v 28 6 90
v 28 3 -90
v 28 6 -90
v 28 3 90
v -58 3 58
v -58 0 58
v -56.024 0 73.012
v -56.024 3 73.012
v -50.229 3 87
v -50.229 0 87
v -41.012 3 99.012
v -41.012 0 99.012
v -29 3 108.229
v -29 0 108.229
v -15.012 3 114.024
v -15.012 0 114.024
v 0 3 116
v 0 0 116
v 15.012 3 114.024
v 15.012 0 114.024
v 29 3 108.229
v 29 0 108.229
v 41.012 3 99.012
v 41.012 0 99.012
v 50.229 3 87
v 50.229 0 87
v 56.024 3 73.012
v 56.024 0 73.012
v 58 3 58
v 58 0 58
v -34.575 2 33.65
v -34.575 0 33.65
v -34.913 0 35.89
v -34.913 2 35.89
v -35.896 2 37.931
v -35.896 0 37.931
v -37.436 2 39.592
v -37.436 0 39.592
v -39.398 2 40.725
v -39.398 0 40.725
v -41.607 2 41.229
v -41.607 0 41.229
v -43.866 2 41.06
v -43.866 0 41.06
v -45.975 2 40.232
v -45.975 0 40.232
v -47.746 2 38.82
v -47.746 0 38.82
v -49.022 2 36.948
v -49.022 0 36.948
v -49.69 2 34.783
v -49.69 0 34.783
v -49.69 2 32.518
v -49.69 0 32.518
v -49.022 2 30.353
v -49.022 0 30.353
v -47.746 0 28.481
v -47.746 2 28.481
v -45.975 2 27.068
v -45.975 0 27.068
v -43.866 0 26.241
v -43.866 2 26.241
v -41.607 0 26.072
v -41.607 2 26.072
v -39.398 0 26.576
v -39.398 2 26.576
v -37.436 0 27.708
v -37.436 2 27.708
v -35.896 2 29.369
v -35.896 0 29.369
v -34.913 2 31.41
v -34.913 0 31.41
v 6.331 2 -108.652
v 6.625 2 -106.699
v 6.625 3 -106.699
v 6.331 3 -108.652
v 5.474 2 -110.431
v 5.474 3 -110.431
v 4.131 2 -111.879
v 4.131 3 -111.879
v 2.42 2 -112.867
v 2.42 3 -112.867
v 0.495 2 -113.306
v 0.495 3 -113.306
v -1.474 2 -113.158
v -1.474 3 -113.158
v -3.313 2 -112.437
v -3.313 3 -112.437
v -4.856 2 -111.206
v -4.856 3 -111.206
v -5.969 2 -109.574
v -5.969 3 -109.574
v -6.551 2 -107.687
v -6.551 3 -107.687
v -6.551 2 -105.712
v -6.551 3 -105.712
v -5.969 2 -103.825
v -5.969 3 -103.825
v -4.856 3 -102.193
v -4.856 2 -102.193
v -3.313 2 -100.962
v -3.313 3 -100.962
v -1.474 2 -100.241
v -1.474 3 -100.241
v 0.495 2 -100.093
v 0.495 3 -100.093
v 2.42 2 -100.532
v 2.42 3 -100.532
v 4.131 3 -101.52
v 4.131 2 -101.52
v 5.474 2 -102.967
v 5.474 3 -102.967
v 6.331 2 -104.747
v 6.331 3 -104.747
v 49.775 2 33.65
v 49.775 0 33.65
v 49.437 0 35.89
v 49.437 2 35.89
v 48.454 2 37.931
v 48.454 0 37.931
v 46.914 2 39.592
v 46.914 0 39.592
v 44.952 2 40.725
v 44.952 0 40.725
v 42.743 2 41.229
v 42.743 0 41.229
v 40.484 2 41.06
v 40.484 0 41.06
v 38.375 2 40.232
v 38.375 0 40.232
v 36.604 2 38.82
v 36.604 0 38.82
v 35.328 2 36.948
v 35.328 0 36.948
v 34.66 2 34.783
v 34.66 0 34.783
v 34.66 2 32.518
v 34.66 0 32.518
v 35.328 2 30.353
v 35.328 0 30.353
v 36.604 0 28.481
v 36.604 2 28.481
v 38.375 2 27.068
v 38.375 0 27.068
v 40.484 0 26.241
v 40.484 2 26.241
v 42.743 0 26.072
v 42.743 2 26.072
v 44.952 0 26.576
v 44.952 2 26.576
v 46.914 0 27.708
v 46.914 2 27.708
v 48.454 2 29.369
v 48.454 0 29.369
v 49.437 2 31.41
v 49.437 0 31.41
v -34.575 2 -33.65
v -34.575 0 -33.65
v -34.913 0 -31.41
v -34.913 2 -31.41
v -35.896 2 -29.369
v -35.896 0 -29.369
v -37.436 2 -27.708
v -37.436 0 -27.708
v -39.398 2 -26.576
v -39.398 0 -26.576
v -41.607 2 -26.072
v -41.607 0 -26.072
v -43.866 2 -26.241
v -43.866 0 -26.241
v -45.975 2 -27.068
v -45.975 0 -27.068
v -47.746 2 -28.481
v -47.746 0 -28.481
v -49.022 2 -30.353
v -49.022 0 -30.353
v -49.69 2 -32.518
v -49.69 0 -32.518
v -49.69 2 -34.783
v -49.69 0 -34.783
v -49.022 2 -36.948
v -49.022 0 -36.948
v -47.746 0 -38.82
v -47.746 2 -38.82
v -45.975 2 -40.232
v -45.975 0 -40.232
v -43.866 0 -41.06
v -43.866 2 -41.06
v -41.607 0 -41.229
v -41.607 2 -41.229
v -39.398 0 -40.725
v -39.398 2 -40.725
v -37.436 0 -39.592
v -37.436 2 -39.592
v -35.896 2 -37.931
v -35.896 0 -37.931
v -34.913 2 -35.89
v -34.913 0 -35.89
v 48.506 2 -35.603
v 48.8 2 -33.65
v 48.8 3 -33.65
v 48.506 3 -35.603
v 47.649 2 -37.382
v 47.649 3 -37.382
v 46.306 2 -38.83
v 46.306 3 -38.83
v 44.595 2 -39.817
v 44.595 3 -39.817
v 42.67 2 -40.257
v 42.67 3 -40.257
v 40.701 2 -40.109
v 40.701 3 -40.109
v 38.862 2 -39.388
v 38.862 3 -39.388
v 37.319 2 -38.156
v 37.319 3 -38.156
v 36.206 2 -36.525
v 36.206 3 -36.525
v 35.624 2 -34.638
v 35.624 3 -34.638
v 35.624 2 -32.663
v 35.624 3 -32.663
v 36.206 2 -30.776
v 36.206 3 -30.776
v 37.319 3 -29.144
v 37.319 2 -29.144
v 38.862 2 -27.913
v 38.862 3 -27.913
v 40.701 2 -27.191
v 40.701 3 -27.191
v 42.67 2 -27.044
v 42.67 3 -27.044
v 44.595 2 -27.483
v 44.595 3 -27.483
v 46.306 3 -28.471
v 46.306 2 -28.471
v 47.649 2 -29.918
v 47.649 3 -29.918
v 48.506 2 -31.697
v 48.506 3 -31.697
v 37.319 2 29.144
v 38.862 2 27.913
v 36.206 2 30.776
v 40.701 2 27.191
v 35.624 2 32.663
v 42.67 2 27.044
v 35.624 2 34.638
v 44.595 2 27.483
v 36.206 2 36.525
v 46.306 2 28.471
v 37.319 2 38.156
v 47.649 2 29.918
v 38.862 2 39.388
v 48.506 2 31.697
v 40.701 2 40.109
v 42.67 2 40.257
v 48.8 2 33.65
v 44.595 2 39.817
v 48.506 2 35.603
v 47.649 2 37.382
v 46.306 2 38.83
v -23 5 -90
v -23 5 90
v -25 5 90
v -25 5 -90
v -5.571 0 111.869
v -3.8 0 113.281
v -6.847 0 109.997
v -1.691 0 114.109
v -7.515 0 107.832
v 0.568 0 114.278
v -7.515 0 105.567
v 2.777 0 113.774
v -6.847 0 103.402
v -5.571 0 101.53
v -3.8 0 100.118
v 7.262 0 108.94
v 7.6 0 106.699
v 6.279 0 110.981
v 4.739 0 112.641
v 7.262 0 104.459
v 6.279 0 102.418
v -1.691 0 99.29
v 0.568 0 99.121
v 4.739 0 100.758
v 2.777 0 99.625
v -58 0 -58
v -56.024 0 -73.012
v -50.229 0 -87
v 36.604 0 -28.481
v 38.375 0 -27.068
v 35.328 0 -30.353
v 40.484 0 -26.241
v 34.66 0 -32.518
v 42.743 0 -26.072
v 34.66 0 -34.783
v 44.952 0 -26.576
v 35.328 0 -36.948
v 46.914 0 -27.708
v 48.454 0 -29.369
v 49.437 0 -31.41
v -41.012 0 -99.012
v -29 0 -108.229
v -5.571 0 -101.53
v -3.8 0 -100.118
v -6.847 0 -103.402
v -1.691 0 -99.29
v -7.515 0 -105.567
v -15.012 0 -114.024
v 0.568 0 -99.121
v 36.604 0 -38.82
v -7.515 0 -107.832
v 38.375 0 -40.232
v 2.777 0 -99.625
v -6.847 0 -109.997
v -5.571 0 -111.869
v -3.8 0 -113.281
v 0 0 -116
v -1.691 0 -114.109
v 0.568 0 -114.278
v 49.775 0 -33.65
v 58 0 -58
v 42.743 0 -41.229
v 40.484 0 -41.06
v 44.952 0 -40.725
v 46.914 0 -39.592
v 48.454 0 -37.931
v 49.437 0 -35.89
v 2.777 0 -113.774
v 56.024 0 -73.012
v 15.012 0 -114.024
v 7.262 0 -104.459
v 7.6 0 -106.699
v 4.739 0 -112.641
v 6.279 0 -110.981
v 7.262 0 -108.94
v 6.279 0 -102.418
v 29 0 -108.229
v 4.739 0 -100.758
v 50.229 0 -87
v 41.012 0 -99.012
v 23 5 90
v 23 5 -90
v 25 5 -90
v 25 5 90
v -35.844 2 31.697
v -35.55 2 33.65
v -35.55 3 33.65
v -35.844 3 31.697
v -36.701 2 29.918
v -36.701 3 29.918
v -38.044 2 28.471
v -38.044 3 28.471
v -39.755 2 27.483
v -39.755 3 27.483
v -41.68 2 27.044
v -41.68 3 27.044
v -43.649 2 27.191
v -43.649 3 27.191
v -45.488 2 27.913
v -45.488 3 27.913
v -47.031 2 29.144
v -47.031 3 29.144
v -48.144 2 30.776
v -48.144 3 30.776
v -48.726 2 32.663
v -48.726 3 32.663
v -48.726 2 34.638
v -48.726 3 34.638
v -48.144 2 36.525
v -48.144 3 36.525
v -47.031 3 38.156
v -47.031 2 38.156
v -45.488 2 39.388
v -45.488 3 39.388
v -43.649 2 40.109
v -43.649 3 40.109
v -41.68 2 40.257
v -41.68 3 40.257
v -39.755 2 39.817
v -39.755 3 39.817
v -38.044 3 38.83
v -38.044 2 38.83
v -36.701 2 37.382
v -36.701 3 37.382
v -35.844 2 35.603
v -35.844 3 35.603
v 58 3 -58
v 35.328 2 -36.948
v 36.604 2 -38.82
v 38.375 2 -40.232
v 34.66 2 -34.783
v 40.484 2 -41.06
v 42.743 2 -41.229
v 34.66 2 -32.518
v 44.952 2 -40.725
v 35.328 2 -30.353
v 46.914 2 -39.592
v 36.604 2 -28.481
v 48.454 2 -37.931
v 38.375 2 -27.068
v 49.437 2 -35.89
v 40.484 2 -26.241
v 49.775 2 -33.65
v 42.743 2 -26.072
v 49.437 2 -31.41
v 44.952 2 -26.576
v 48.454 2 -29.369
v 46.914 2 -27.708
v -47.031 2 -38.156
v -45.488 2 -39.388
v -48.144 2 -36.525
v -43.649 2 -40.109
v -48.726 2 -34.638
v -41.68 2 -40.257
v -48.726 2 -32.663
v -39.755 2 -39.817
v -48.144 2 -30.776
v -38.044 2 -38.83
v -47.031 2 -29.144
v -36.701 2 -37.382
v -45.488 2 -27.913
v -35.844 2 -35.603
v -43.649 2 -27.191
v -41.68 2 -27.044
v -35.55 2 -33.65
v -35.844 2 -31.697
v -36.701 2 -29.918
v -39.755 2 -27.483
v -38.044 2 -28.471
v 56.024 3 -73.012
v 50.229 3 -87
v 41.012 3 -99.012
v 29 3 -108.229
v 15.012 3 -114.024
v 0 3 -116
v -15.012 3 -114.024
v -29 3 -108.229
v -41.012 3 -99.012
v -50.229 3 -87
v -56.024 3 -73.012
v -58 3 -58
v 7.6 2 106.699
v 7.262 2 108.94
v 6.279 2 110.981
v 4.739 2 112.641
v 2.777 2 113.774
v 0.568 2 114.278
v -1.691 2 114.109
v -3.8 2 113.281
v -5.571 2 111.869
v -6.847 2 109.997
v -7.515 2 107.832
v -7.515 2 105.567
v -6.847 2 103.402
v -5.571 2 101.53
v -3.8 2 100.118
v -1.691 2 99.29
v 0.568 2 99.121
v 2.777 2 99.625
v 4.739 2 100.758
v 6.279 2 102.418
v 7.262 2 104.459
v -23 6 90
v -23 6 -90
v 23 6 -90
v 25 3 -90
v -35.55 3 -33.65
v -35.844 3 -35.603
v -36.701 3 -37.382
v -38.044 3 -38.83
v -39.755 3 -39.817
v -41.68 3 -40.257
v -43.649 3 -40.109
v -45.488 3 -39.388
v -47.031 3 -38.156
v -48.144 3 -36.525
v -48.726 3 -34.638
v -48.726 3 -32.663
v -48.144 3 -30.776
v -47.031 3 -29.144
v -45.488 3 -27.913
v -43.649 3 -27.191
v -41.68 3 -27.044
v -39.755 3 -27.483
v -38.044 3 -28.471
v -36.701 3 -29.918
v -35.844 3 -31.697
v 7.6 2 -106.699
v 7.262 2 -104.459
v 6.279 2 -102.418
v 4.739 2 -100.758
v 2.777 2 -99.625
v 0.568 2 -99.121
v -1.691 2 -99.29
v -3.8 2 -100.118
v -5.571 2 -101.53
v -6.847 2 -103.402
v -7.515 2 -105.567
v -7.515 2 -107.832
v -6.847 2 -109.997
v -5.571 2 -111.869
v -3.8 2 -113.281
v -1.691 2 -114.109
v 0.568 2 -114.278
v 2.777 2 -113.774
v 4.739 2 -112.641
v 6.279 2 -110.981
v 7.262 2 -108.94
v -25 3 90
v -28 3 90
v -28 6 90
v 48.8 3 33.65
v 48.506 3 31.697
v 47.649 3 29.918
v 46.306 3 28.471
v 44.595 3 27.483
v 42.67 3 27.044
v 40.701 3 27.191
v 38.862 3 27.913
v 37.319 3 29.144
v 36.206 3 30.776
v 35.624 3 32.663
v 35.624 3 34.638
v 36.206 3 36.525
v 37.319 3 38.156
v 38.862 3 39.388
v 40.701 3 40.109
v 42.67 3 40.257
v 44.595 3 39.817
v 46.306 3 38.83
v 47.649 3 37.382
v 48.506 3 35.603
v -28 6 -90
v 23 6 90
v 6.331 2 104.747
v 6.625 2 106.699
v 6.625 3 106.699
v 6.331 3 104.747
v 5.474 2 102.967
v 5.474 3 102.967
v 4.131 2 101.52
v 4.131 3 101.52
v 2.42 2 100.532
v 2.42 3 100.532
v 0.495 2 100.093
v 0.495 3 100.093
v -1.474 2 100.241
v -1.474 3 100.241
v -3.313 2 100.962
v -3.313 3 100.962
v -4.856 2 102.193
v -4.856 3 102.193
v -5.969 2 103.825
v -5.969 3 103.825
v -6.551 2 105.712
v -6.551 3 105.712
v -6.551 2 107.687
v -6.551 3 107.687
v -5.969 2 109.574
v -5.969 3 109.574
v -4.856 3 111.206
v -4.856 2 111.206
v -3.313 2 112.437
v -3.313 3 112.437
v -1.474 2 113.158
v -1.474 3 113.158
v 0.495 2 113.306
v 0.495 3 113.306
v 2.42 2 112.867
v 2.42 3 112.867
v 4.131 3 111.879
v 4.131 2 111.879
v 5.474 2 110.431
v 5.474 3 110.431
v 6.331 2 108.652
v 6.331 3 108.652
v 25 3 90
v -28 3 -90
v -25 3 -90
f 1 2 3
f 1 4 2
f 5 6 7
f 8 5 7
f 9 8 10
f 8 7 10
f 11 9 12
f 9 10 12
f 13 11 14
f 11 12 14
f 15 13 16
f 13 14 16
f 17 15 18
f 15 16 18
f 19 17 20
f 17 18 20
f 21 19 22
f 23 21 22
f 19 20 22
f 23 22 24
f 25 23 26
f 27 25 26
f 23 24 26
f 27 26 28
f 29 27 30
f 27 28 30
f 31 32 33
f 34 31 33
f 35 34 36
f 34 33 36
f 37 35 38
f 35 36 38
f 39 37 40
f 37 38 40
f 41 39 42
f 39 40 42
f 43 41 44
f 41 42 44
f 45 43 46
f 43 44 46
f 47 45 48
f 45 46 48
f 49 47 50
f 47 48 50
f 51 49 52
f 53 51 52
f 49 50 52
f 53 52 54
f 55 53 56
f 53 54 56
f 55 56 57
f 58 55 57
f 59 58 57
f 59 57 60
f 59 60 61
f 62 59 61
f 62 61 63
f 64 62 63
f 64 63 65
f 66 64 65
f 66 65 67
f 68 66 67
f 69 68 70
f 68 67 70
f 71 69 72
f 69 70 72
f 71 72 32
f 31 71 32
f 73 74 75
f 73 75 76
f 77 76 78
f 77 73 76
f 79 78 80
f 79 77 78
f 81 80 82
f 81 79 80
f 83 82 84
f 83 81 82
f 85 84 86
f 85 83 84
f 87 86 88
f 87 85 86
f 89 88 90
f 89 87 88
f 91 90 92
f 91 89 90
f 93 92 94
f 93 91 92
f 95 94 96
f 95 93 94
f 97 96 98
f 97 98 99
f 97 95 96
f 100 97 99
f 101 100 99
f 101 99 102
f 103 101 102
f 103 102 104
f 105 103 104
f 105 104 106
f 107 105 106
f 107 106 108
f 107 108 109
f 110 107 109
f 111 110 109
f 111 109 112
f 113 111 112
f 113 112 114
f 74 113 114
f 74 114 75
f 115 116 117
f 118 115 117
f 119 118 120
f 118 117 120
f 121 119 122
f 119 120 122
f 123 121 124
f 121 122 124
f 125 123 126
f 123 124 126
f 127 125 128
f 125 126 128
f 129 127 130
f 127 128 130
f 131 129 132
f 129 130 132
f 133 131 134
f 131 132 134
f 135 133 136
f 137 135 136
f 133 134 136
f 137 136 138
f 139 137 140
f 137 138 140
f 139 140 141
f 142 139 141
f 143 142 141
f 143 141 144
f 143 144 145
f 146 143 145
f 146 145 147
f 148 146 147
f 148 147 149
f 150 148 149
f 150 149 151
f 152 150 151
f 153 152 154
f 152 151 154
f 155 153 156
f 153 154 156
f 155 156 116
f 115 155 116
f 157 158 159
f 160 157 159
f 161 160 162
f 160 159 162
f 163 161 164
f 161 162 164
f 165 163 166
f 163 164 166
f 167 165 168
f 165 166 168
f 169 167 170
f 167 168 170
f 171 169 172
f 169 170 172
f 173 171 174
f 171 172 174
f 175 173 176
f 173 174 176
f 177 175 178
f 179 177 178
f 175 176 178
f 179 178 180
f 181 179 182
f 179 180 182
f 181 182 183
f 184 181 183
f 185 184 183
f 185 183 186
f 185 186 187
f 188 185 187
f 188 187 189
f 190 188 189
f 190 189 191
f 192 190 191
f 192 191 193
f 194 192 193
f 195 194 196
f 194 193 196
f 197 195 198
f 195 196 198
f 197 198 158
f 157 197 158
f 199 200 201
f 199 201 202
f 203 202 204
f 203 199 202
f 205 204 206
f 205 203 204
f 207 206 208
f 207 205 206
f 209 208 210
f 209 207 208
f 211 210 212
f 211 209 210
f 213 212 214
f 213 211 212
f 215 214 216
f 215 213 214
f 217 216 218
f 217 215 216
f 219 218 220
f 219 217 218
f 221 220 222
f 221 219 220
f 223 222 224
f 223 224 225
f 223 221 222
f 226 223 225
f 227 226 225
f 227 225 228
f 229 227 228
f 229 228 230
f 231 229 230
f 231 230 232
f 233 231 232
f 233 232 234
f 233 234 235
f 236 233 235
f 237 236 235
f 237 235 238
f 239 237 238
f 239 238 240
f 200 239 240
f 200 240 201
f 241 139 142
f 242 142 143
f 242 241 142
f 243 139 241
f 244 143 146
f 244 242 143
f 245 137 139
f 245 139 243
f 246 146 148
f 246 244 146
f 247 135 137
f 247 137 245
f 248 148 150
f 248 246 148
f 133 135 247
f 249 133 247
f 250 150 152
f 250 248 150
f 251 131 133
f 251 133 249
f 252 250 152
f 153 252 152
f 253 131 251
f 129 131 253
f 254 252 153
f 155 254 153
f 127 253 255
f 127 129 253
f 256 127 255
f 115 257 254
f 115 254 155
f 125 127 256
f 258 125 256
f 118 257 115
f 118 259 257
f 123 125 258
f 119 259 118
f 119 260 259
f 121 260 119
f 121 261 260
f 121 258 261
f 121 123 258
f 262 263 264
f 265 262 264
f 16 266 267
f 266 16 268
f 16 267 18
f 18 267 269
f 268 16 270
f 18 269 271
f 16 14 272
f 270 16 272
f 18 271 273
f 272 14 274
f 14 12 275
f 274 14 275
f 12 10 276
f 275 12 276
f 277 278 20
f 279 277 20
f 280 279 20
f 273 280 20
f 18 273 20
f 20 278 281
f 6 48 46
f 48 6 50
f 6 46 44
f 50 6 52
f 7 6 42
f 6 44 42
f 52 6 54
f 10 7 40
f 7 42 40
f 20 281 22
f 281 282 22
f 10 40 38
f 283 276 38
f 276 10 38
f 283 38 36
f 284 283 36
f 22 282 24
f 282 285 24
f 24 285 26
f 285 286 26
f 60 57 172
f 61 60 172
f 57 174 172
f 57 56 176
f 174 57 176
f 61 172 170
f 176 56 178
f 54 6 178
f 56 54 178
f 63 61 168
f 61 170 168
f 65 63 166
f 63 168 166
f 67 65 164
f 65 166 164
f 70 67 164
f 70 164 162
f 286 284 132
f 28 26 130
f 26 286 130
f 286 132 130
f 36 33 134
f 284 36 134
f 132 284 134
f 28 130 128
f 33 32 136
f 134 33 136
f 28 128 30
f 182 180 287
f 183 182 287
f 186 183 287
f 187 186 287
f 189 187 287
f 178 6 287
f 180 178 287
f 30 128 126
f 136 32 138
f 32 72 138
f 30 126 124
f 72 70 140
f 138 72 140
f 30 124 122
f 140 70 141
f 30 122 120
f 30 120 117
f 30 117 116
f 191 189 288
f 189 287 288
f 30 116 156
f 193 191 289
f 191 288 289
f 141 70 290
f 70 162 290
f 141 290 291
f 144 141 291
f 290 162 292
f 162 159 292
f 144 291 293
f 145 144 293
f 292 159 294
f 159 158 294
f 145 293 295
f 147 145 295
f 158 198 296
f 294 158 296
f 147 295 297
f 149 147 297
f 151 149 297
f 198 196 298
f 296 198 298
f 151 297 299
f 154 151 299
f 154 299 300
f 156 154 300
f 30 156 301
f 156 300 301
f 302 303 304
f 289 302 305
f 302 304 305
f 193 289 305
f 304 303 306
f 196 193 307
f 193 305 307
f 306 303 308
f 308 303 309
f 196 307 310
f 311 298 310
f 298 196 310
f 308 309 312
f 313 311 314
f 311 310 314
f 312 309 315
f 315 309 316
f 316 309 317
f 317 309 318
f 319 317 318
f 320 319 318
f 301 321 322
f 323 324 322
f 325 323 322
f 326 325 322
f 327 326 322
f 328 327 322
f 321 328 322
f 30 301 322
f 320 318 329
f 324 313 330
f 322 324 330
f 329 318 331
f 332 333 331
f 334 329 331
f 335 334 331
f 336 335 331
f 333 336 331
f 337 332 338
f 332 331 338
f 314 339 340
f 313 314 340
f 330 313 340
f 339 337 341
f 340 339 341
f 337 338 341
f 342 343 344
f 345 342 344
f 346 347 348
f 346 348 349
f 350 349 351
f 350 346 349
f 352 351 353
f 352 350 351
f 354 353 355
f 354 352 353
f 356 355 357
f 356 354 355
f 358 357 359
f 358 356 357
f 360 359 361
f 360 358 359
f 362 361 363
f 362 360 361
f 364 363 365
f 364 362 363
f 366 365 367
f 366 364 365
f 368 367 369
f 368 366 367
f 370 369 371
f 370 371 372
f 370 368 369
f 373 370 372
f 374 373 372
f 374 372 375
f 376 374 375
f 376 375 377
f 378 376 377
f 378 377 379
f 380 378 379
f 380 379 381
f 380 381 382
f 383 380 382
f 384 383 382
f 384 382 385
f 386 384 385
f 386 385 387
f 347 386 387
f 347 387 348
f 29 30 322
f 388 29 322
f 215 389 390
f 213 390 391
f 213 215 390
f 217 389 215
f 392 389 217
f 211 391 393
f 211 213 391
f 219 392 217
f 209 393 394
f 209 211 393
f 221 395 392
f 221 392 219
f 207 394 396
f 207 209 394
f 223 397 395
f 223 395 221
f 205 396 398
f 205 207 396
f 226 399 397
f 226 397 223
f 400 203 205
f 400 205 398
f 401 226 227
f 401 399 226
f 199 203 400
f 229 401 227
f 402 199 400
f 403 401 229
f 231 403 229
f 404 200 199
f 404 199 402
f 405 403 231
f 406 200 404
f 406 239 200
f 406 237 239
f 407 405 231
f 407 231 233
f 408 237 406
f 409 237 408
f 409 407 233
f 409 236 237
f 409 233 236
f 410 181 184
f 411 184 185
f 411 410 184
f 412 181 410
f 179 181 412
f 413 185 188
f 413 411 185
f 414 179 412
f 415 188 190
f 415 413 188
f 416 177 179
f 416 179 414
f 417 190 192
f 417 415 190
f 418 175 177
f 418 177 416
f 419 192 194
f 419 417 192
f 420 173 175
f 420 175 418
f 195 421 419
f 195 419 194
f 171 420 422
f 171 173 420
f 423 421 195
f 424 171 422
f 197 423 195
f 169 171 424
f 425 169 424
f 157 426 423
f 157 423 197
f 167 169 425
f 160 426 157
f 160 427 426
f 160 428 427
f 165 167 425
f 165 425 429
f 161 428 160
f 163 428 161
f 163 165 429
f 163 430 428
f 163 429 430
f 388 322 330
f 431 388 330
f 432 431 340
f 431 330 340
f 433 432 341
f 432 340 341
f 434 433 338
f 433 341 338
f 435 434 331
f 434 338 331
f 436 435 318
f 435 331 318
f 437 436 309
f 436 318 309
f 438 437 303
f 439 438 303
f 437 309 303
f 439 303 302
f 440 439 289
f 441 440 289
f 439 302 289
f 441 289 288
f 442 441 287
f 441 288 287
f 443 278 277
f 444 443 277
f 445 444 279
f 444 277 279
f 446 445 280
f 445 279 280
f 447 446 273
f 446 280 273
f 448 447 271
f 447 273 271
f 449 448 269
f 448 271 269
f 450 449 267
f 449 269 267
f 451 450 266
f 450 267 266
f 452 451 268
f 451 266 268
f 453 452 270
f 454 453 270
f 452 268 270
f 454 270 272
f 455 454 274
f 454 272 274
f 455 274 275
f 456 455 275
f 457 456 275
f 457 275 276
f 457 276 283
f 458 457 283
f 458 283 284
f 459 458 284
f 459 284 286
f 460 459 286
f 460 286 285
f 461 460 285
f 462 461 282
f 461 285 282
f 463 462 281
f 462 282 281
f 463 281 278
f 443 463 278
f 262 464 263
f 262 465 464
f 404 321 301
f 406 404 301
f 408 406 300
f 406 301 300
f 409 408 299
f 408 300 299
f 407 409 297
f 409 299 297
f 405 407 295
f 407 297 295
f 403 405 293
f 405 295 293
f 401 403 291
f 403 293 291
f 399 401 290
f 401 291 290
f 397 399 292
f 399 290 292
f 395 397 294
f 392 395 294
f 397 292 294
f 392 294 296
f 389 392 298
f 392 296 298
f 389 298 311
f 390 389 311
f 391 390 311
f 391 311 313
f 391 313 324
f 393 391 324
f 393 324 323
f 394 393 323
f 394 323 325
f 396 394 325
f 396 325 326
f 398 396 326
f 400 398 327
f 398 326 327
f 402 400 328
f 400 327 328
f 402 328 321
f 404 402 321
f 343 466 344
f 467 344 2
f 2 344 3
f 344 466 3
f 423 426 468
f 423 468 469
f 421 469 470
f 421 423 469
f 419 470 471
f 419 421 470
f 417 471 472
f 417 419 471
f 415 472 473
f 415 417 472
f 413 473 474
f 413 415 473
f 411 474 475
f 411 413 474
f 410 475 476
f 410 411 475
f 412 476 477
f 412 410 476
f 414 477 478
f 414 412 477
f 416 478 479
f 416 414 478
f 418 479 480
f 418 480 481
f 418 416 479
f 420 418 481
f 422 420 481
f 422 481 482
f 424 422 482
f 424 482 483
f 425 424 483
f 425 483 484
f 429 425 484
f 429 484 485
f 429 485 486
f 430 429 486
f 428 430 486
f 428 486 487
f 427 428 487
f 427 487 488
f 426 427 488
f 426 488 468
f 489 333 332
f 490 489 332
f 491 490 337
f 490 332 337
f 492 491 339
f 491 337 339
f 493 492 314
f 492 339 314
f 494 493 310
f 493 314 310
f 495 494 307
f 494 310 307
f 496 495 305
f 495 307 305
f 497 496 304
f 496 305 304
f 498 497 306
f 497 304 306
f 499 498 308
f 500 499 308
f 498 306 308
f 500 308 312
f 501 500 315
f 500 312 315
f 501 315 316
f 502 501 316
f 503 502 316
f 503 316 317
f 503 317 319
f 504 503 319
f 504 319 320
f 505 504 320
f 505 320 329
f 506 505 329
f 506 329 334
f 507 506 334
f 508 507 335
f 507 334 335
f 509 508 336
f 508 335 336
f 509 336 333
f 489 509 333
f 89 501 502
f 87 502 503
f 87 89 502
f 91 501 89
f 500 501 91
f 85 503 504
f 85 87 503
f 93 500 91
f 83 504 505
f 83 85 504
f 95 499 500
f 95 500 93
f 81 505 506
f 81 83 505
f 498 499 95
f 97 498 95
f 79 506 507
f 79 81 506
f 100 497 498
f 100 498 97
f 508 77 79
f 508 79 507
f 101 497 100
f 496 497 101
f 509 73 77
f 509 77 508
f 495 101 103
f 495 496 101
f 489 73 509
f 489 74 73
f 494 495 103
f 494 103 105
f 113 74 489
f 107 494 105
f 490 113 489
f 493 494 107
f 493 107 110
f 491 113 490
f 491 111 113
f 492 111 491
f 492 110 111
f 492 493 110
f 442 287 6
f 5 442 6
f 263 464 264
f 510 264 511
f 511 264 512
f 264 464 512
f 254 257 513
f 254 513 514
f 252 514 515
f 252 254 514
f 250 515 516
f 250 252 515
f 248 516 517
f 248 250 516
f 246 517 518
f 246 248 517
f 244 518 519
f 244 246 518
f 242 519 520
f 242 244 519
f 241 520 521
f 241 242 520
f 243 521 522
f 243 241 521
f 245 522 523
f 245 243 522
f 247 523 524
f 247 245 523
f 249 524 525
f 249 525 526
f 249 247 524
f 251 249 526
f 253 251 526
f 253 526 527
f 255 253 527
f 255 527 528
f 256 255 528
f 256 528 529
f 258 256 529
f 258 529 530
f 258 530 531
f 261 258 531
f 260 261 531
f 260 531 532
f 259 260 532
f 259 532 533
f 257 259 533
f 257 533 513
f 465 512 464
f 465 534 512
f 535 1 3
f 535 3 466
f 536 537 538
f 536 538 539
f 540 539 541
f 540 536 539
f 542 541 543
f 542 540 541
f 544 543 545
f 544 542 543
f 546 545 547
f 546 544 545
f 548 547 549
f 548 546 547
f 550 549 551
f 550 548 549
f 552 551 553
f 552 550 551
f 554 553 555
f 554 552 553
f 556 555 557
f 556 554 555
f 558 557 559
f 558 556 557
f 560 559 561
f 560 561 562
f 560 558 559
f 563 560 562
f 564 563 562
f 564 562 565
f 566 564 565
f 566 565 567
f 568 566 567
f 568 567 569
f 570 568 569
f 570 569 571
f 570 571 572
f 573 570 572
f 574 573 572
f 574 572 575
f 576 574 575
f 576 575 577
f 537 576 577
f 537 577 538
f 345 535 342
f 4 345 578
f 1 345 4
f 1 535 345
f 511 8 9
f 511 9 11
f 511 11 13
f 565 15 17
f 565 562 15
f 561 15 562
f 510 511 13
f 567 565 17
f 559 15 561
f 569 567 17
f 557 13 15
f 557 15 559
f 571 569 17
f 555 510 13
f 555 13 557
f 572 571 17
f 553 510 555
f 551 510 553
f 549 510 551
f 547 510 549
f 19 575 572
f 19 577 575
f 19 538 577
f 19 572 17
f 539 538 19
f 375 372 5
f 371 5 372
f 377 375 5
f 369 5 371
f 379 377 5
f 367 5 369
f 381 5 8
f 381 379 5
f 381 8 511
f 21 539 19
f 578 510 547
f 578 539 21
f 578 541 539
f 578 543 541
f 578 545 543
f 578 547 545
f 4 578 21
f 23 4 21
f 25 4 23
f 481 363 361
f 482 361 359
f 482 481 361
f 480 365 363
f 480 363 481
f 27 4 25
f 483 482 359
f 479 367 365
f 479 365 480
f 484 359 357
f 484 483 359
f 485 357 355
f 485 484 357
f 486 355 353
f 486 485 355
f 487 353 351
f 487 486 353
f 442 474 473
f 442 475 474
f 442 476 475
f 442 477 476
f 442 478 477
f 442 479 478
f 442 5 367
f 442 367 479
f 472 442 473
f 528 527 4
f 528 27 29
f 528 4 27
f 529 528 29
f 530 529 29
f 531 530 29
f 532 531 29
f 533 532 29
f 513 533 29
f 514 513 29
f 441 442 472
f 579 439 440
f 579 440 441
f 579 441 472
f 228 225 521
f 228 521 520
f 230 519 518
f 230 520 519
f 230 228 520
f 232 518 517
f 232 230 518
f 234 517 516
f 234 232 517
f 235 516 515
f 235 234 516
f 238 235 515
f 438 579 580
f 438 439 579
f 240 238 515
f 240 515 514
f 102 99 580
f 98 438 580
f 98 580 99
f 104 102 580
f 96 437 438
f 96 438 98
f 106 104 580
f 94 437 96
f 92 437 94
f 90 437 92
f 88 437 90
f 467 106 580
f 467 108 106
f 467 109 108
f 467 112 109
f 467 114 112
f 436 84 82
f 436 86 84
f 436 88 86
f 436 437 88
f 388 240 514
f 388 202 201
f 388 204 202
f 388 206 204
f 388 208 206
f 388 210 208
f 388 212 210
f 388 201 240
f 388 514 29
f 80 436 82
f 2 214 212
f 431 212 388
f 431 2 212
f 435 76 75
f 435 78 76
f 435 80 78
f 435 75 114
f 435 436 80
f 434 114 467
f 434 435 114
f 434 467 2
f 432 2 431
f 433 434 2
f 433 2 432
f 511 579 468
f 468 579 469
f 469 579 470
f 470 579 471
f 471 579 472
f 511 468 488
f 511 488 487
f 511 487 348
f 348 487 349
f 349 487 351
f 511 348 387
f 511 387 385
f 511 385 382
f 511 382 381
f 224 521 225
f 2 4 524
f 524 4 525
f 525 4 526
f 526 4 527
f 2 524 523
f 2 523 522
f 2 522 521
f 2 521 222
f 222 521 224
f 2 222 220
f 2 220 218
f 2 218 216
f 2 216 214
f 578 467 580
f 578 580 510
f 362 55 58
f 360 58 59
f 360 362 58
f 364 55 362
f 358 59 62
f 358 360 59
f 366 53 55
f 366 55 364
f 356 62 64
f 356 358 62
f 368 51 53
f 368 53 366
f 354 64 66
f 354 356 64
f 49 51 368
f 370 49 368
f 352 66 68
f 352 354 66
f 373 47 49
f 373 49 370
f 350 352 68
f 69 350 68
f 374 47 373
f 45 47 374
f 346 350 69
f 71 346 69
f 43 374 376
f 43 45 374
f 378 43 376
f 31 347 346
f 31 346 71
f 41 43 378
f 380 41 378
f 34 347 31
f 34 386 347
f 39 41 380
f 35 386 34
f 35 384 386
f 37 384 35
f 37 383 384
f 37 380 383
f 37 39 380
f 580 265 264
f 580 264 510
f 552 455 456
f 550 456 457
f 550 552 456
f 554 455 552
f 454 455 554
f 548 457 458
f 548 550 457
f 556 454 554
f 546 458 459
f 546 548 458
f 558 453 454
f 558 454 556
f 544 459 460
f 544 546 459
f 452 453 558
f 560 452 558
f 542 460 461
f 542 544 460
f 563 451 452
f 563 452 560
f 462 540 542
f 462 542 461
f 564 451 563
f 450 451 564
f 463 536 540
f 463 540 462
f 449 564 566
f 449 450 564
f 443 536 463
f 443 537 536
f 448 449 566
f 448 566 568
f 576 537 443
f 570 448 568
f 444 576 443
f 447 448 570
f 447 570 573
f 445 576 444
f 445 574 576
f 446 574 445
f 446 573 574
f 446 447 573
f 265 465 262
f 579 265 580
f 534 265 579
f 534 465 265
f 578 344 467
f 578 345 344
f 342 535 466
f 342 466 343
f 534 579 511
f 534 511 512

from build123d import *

# Parameters (mm, degrees)
SKETCH1_R           = 6.625
BOSS_EXTRUDE1_DEPTH = 3
SKETCH2_R           = 7.6
CUT_EXTRUDE1_DEPTH  = 2
BOSS_EXTRUDE2_DEPTH = 90


with BuildPart() as part:
    # Sketch1 → Boss-Extrude1 (new body)
    with BuildSketch(Plane(origin=(0, 0, 0), x_dir=(1, 0, 0), z_dir=(0, 1, 0))):
        with BuildLine():
            Line((58, -58), (58, 58))
            ThreePointArc((58, 58), (0, 116), (-58, 58))
            Line((-58, 58), (-58, -58))
            ThreePointArc((-58, -58), (0, -116), (58, -58))
        make_face()
        with Locations((0, 106.699495206)):
            Circle(SKETCH1_R, mode=Mode.SUBTRACT)
        with Locations((42.175, 33.650252397)):
            Circle(SKETCH1_R, mode=Mode.SUBTRACT)
        with Locations((-42.175, 33.650252397)):
            Circle(SKETCH1_R, mode=Mode.SUBTRACT)
        with Locations((-42.175, -33.650252397)):
            Circle(SKETCH1_R, mode=Mode.SUBTRACT)
        with Locations((0, -106.699495206)):
            Circle(SKETCH1_R, mode=Mode.SUBTRACT)
        with Locations((42.175, -33.650252397)):
            Circle(SKETCH1_R, mode=Mode.SUBTRACT)
    extrude(amount=BOSS_EXTRUDE1_DEPTH)

    # Sketch2 → Cut-Extrude1 (cut)
    with BuildSketch(Plane.XZ):
        with Locations((42.175, -33.650252397)):
            Circle(SKETCH2_R)
        with Locations((-42.175, -33.650252397)):
            Circle(SKETCH2_R)
        with Locations((0, -106.699495206)):
            Circle(SKETCH2_R)
        with Locations((42.175, 33.650252397)):
            Circle(SKETCH2_R)
        with Locations((0, 106.699495206)):
            Circle(SKETCH2_R)
        with Locations((-42.175, 33.650252397)):
            Circle(SKETCH2_R)
    extrude(amount=-CUT_EXTRUDE1_DEPTH, mode=Mode.SUBTRACT)

    # Sketch3 → Boss-Extrude2 (add, symmetric)
    with BuildSketch(Plane.XY):
        Polygon((-23, 5), (-25, 5), (-25, 3), (-28, 3), (-28, 6), (-23, 6), align=None)
        Polygon((28, 3), (28, 6), (23, 6), (23, 5), (25, 5), (25, 3), align=None)
    extrude(amount=BOSS_EXTRUDE2_DEPTH, both=True)


solid = part.part
